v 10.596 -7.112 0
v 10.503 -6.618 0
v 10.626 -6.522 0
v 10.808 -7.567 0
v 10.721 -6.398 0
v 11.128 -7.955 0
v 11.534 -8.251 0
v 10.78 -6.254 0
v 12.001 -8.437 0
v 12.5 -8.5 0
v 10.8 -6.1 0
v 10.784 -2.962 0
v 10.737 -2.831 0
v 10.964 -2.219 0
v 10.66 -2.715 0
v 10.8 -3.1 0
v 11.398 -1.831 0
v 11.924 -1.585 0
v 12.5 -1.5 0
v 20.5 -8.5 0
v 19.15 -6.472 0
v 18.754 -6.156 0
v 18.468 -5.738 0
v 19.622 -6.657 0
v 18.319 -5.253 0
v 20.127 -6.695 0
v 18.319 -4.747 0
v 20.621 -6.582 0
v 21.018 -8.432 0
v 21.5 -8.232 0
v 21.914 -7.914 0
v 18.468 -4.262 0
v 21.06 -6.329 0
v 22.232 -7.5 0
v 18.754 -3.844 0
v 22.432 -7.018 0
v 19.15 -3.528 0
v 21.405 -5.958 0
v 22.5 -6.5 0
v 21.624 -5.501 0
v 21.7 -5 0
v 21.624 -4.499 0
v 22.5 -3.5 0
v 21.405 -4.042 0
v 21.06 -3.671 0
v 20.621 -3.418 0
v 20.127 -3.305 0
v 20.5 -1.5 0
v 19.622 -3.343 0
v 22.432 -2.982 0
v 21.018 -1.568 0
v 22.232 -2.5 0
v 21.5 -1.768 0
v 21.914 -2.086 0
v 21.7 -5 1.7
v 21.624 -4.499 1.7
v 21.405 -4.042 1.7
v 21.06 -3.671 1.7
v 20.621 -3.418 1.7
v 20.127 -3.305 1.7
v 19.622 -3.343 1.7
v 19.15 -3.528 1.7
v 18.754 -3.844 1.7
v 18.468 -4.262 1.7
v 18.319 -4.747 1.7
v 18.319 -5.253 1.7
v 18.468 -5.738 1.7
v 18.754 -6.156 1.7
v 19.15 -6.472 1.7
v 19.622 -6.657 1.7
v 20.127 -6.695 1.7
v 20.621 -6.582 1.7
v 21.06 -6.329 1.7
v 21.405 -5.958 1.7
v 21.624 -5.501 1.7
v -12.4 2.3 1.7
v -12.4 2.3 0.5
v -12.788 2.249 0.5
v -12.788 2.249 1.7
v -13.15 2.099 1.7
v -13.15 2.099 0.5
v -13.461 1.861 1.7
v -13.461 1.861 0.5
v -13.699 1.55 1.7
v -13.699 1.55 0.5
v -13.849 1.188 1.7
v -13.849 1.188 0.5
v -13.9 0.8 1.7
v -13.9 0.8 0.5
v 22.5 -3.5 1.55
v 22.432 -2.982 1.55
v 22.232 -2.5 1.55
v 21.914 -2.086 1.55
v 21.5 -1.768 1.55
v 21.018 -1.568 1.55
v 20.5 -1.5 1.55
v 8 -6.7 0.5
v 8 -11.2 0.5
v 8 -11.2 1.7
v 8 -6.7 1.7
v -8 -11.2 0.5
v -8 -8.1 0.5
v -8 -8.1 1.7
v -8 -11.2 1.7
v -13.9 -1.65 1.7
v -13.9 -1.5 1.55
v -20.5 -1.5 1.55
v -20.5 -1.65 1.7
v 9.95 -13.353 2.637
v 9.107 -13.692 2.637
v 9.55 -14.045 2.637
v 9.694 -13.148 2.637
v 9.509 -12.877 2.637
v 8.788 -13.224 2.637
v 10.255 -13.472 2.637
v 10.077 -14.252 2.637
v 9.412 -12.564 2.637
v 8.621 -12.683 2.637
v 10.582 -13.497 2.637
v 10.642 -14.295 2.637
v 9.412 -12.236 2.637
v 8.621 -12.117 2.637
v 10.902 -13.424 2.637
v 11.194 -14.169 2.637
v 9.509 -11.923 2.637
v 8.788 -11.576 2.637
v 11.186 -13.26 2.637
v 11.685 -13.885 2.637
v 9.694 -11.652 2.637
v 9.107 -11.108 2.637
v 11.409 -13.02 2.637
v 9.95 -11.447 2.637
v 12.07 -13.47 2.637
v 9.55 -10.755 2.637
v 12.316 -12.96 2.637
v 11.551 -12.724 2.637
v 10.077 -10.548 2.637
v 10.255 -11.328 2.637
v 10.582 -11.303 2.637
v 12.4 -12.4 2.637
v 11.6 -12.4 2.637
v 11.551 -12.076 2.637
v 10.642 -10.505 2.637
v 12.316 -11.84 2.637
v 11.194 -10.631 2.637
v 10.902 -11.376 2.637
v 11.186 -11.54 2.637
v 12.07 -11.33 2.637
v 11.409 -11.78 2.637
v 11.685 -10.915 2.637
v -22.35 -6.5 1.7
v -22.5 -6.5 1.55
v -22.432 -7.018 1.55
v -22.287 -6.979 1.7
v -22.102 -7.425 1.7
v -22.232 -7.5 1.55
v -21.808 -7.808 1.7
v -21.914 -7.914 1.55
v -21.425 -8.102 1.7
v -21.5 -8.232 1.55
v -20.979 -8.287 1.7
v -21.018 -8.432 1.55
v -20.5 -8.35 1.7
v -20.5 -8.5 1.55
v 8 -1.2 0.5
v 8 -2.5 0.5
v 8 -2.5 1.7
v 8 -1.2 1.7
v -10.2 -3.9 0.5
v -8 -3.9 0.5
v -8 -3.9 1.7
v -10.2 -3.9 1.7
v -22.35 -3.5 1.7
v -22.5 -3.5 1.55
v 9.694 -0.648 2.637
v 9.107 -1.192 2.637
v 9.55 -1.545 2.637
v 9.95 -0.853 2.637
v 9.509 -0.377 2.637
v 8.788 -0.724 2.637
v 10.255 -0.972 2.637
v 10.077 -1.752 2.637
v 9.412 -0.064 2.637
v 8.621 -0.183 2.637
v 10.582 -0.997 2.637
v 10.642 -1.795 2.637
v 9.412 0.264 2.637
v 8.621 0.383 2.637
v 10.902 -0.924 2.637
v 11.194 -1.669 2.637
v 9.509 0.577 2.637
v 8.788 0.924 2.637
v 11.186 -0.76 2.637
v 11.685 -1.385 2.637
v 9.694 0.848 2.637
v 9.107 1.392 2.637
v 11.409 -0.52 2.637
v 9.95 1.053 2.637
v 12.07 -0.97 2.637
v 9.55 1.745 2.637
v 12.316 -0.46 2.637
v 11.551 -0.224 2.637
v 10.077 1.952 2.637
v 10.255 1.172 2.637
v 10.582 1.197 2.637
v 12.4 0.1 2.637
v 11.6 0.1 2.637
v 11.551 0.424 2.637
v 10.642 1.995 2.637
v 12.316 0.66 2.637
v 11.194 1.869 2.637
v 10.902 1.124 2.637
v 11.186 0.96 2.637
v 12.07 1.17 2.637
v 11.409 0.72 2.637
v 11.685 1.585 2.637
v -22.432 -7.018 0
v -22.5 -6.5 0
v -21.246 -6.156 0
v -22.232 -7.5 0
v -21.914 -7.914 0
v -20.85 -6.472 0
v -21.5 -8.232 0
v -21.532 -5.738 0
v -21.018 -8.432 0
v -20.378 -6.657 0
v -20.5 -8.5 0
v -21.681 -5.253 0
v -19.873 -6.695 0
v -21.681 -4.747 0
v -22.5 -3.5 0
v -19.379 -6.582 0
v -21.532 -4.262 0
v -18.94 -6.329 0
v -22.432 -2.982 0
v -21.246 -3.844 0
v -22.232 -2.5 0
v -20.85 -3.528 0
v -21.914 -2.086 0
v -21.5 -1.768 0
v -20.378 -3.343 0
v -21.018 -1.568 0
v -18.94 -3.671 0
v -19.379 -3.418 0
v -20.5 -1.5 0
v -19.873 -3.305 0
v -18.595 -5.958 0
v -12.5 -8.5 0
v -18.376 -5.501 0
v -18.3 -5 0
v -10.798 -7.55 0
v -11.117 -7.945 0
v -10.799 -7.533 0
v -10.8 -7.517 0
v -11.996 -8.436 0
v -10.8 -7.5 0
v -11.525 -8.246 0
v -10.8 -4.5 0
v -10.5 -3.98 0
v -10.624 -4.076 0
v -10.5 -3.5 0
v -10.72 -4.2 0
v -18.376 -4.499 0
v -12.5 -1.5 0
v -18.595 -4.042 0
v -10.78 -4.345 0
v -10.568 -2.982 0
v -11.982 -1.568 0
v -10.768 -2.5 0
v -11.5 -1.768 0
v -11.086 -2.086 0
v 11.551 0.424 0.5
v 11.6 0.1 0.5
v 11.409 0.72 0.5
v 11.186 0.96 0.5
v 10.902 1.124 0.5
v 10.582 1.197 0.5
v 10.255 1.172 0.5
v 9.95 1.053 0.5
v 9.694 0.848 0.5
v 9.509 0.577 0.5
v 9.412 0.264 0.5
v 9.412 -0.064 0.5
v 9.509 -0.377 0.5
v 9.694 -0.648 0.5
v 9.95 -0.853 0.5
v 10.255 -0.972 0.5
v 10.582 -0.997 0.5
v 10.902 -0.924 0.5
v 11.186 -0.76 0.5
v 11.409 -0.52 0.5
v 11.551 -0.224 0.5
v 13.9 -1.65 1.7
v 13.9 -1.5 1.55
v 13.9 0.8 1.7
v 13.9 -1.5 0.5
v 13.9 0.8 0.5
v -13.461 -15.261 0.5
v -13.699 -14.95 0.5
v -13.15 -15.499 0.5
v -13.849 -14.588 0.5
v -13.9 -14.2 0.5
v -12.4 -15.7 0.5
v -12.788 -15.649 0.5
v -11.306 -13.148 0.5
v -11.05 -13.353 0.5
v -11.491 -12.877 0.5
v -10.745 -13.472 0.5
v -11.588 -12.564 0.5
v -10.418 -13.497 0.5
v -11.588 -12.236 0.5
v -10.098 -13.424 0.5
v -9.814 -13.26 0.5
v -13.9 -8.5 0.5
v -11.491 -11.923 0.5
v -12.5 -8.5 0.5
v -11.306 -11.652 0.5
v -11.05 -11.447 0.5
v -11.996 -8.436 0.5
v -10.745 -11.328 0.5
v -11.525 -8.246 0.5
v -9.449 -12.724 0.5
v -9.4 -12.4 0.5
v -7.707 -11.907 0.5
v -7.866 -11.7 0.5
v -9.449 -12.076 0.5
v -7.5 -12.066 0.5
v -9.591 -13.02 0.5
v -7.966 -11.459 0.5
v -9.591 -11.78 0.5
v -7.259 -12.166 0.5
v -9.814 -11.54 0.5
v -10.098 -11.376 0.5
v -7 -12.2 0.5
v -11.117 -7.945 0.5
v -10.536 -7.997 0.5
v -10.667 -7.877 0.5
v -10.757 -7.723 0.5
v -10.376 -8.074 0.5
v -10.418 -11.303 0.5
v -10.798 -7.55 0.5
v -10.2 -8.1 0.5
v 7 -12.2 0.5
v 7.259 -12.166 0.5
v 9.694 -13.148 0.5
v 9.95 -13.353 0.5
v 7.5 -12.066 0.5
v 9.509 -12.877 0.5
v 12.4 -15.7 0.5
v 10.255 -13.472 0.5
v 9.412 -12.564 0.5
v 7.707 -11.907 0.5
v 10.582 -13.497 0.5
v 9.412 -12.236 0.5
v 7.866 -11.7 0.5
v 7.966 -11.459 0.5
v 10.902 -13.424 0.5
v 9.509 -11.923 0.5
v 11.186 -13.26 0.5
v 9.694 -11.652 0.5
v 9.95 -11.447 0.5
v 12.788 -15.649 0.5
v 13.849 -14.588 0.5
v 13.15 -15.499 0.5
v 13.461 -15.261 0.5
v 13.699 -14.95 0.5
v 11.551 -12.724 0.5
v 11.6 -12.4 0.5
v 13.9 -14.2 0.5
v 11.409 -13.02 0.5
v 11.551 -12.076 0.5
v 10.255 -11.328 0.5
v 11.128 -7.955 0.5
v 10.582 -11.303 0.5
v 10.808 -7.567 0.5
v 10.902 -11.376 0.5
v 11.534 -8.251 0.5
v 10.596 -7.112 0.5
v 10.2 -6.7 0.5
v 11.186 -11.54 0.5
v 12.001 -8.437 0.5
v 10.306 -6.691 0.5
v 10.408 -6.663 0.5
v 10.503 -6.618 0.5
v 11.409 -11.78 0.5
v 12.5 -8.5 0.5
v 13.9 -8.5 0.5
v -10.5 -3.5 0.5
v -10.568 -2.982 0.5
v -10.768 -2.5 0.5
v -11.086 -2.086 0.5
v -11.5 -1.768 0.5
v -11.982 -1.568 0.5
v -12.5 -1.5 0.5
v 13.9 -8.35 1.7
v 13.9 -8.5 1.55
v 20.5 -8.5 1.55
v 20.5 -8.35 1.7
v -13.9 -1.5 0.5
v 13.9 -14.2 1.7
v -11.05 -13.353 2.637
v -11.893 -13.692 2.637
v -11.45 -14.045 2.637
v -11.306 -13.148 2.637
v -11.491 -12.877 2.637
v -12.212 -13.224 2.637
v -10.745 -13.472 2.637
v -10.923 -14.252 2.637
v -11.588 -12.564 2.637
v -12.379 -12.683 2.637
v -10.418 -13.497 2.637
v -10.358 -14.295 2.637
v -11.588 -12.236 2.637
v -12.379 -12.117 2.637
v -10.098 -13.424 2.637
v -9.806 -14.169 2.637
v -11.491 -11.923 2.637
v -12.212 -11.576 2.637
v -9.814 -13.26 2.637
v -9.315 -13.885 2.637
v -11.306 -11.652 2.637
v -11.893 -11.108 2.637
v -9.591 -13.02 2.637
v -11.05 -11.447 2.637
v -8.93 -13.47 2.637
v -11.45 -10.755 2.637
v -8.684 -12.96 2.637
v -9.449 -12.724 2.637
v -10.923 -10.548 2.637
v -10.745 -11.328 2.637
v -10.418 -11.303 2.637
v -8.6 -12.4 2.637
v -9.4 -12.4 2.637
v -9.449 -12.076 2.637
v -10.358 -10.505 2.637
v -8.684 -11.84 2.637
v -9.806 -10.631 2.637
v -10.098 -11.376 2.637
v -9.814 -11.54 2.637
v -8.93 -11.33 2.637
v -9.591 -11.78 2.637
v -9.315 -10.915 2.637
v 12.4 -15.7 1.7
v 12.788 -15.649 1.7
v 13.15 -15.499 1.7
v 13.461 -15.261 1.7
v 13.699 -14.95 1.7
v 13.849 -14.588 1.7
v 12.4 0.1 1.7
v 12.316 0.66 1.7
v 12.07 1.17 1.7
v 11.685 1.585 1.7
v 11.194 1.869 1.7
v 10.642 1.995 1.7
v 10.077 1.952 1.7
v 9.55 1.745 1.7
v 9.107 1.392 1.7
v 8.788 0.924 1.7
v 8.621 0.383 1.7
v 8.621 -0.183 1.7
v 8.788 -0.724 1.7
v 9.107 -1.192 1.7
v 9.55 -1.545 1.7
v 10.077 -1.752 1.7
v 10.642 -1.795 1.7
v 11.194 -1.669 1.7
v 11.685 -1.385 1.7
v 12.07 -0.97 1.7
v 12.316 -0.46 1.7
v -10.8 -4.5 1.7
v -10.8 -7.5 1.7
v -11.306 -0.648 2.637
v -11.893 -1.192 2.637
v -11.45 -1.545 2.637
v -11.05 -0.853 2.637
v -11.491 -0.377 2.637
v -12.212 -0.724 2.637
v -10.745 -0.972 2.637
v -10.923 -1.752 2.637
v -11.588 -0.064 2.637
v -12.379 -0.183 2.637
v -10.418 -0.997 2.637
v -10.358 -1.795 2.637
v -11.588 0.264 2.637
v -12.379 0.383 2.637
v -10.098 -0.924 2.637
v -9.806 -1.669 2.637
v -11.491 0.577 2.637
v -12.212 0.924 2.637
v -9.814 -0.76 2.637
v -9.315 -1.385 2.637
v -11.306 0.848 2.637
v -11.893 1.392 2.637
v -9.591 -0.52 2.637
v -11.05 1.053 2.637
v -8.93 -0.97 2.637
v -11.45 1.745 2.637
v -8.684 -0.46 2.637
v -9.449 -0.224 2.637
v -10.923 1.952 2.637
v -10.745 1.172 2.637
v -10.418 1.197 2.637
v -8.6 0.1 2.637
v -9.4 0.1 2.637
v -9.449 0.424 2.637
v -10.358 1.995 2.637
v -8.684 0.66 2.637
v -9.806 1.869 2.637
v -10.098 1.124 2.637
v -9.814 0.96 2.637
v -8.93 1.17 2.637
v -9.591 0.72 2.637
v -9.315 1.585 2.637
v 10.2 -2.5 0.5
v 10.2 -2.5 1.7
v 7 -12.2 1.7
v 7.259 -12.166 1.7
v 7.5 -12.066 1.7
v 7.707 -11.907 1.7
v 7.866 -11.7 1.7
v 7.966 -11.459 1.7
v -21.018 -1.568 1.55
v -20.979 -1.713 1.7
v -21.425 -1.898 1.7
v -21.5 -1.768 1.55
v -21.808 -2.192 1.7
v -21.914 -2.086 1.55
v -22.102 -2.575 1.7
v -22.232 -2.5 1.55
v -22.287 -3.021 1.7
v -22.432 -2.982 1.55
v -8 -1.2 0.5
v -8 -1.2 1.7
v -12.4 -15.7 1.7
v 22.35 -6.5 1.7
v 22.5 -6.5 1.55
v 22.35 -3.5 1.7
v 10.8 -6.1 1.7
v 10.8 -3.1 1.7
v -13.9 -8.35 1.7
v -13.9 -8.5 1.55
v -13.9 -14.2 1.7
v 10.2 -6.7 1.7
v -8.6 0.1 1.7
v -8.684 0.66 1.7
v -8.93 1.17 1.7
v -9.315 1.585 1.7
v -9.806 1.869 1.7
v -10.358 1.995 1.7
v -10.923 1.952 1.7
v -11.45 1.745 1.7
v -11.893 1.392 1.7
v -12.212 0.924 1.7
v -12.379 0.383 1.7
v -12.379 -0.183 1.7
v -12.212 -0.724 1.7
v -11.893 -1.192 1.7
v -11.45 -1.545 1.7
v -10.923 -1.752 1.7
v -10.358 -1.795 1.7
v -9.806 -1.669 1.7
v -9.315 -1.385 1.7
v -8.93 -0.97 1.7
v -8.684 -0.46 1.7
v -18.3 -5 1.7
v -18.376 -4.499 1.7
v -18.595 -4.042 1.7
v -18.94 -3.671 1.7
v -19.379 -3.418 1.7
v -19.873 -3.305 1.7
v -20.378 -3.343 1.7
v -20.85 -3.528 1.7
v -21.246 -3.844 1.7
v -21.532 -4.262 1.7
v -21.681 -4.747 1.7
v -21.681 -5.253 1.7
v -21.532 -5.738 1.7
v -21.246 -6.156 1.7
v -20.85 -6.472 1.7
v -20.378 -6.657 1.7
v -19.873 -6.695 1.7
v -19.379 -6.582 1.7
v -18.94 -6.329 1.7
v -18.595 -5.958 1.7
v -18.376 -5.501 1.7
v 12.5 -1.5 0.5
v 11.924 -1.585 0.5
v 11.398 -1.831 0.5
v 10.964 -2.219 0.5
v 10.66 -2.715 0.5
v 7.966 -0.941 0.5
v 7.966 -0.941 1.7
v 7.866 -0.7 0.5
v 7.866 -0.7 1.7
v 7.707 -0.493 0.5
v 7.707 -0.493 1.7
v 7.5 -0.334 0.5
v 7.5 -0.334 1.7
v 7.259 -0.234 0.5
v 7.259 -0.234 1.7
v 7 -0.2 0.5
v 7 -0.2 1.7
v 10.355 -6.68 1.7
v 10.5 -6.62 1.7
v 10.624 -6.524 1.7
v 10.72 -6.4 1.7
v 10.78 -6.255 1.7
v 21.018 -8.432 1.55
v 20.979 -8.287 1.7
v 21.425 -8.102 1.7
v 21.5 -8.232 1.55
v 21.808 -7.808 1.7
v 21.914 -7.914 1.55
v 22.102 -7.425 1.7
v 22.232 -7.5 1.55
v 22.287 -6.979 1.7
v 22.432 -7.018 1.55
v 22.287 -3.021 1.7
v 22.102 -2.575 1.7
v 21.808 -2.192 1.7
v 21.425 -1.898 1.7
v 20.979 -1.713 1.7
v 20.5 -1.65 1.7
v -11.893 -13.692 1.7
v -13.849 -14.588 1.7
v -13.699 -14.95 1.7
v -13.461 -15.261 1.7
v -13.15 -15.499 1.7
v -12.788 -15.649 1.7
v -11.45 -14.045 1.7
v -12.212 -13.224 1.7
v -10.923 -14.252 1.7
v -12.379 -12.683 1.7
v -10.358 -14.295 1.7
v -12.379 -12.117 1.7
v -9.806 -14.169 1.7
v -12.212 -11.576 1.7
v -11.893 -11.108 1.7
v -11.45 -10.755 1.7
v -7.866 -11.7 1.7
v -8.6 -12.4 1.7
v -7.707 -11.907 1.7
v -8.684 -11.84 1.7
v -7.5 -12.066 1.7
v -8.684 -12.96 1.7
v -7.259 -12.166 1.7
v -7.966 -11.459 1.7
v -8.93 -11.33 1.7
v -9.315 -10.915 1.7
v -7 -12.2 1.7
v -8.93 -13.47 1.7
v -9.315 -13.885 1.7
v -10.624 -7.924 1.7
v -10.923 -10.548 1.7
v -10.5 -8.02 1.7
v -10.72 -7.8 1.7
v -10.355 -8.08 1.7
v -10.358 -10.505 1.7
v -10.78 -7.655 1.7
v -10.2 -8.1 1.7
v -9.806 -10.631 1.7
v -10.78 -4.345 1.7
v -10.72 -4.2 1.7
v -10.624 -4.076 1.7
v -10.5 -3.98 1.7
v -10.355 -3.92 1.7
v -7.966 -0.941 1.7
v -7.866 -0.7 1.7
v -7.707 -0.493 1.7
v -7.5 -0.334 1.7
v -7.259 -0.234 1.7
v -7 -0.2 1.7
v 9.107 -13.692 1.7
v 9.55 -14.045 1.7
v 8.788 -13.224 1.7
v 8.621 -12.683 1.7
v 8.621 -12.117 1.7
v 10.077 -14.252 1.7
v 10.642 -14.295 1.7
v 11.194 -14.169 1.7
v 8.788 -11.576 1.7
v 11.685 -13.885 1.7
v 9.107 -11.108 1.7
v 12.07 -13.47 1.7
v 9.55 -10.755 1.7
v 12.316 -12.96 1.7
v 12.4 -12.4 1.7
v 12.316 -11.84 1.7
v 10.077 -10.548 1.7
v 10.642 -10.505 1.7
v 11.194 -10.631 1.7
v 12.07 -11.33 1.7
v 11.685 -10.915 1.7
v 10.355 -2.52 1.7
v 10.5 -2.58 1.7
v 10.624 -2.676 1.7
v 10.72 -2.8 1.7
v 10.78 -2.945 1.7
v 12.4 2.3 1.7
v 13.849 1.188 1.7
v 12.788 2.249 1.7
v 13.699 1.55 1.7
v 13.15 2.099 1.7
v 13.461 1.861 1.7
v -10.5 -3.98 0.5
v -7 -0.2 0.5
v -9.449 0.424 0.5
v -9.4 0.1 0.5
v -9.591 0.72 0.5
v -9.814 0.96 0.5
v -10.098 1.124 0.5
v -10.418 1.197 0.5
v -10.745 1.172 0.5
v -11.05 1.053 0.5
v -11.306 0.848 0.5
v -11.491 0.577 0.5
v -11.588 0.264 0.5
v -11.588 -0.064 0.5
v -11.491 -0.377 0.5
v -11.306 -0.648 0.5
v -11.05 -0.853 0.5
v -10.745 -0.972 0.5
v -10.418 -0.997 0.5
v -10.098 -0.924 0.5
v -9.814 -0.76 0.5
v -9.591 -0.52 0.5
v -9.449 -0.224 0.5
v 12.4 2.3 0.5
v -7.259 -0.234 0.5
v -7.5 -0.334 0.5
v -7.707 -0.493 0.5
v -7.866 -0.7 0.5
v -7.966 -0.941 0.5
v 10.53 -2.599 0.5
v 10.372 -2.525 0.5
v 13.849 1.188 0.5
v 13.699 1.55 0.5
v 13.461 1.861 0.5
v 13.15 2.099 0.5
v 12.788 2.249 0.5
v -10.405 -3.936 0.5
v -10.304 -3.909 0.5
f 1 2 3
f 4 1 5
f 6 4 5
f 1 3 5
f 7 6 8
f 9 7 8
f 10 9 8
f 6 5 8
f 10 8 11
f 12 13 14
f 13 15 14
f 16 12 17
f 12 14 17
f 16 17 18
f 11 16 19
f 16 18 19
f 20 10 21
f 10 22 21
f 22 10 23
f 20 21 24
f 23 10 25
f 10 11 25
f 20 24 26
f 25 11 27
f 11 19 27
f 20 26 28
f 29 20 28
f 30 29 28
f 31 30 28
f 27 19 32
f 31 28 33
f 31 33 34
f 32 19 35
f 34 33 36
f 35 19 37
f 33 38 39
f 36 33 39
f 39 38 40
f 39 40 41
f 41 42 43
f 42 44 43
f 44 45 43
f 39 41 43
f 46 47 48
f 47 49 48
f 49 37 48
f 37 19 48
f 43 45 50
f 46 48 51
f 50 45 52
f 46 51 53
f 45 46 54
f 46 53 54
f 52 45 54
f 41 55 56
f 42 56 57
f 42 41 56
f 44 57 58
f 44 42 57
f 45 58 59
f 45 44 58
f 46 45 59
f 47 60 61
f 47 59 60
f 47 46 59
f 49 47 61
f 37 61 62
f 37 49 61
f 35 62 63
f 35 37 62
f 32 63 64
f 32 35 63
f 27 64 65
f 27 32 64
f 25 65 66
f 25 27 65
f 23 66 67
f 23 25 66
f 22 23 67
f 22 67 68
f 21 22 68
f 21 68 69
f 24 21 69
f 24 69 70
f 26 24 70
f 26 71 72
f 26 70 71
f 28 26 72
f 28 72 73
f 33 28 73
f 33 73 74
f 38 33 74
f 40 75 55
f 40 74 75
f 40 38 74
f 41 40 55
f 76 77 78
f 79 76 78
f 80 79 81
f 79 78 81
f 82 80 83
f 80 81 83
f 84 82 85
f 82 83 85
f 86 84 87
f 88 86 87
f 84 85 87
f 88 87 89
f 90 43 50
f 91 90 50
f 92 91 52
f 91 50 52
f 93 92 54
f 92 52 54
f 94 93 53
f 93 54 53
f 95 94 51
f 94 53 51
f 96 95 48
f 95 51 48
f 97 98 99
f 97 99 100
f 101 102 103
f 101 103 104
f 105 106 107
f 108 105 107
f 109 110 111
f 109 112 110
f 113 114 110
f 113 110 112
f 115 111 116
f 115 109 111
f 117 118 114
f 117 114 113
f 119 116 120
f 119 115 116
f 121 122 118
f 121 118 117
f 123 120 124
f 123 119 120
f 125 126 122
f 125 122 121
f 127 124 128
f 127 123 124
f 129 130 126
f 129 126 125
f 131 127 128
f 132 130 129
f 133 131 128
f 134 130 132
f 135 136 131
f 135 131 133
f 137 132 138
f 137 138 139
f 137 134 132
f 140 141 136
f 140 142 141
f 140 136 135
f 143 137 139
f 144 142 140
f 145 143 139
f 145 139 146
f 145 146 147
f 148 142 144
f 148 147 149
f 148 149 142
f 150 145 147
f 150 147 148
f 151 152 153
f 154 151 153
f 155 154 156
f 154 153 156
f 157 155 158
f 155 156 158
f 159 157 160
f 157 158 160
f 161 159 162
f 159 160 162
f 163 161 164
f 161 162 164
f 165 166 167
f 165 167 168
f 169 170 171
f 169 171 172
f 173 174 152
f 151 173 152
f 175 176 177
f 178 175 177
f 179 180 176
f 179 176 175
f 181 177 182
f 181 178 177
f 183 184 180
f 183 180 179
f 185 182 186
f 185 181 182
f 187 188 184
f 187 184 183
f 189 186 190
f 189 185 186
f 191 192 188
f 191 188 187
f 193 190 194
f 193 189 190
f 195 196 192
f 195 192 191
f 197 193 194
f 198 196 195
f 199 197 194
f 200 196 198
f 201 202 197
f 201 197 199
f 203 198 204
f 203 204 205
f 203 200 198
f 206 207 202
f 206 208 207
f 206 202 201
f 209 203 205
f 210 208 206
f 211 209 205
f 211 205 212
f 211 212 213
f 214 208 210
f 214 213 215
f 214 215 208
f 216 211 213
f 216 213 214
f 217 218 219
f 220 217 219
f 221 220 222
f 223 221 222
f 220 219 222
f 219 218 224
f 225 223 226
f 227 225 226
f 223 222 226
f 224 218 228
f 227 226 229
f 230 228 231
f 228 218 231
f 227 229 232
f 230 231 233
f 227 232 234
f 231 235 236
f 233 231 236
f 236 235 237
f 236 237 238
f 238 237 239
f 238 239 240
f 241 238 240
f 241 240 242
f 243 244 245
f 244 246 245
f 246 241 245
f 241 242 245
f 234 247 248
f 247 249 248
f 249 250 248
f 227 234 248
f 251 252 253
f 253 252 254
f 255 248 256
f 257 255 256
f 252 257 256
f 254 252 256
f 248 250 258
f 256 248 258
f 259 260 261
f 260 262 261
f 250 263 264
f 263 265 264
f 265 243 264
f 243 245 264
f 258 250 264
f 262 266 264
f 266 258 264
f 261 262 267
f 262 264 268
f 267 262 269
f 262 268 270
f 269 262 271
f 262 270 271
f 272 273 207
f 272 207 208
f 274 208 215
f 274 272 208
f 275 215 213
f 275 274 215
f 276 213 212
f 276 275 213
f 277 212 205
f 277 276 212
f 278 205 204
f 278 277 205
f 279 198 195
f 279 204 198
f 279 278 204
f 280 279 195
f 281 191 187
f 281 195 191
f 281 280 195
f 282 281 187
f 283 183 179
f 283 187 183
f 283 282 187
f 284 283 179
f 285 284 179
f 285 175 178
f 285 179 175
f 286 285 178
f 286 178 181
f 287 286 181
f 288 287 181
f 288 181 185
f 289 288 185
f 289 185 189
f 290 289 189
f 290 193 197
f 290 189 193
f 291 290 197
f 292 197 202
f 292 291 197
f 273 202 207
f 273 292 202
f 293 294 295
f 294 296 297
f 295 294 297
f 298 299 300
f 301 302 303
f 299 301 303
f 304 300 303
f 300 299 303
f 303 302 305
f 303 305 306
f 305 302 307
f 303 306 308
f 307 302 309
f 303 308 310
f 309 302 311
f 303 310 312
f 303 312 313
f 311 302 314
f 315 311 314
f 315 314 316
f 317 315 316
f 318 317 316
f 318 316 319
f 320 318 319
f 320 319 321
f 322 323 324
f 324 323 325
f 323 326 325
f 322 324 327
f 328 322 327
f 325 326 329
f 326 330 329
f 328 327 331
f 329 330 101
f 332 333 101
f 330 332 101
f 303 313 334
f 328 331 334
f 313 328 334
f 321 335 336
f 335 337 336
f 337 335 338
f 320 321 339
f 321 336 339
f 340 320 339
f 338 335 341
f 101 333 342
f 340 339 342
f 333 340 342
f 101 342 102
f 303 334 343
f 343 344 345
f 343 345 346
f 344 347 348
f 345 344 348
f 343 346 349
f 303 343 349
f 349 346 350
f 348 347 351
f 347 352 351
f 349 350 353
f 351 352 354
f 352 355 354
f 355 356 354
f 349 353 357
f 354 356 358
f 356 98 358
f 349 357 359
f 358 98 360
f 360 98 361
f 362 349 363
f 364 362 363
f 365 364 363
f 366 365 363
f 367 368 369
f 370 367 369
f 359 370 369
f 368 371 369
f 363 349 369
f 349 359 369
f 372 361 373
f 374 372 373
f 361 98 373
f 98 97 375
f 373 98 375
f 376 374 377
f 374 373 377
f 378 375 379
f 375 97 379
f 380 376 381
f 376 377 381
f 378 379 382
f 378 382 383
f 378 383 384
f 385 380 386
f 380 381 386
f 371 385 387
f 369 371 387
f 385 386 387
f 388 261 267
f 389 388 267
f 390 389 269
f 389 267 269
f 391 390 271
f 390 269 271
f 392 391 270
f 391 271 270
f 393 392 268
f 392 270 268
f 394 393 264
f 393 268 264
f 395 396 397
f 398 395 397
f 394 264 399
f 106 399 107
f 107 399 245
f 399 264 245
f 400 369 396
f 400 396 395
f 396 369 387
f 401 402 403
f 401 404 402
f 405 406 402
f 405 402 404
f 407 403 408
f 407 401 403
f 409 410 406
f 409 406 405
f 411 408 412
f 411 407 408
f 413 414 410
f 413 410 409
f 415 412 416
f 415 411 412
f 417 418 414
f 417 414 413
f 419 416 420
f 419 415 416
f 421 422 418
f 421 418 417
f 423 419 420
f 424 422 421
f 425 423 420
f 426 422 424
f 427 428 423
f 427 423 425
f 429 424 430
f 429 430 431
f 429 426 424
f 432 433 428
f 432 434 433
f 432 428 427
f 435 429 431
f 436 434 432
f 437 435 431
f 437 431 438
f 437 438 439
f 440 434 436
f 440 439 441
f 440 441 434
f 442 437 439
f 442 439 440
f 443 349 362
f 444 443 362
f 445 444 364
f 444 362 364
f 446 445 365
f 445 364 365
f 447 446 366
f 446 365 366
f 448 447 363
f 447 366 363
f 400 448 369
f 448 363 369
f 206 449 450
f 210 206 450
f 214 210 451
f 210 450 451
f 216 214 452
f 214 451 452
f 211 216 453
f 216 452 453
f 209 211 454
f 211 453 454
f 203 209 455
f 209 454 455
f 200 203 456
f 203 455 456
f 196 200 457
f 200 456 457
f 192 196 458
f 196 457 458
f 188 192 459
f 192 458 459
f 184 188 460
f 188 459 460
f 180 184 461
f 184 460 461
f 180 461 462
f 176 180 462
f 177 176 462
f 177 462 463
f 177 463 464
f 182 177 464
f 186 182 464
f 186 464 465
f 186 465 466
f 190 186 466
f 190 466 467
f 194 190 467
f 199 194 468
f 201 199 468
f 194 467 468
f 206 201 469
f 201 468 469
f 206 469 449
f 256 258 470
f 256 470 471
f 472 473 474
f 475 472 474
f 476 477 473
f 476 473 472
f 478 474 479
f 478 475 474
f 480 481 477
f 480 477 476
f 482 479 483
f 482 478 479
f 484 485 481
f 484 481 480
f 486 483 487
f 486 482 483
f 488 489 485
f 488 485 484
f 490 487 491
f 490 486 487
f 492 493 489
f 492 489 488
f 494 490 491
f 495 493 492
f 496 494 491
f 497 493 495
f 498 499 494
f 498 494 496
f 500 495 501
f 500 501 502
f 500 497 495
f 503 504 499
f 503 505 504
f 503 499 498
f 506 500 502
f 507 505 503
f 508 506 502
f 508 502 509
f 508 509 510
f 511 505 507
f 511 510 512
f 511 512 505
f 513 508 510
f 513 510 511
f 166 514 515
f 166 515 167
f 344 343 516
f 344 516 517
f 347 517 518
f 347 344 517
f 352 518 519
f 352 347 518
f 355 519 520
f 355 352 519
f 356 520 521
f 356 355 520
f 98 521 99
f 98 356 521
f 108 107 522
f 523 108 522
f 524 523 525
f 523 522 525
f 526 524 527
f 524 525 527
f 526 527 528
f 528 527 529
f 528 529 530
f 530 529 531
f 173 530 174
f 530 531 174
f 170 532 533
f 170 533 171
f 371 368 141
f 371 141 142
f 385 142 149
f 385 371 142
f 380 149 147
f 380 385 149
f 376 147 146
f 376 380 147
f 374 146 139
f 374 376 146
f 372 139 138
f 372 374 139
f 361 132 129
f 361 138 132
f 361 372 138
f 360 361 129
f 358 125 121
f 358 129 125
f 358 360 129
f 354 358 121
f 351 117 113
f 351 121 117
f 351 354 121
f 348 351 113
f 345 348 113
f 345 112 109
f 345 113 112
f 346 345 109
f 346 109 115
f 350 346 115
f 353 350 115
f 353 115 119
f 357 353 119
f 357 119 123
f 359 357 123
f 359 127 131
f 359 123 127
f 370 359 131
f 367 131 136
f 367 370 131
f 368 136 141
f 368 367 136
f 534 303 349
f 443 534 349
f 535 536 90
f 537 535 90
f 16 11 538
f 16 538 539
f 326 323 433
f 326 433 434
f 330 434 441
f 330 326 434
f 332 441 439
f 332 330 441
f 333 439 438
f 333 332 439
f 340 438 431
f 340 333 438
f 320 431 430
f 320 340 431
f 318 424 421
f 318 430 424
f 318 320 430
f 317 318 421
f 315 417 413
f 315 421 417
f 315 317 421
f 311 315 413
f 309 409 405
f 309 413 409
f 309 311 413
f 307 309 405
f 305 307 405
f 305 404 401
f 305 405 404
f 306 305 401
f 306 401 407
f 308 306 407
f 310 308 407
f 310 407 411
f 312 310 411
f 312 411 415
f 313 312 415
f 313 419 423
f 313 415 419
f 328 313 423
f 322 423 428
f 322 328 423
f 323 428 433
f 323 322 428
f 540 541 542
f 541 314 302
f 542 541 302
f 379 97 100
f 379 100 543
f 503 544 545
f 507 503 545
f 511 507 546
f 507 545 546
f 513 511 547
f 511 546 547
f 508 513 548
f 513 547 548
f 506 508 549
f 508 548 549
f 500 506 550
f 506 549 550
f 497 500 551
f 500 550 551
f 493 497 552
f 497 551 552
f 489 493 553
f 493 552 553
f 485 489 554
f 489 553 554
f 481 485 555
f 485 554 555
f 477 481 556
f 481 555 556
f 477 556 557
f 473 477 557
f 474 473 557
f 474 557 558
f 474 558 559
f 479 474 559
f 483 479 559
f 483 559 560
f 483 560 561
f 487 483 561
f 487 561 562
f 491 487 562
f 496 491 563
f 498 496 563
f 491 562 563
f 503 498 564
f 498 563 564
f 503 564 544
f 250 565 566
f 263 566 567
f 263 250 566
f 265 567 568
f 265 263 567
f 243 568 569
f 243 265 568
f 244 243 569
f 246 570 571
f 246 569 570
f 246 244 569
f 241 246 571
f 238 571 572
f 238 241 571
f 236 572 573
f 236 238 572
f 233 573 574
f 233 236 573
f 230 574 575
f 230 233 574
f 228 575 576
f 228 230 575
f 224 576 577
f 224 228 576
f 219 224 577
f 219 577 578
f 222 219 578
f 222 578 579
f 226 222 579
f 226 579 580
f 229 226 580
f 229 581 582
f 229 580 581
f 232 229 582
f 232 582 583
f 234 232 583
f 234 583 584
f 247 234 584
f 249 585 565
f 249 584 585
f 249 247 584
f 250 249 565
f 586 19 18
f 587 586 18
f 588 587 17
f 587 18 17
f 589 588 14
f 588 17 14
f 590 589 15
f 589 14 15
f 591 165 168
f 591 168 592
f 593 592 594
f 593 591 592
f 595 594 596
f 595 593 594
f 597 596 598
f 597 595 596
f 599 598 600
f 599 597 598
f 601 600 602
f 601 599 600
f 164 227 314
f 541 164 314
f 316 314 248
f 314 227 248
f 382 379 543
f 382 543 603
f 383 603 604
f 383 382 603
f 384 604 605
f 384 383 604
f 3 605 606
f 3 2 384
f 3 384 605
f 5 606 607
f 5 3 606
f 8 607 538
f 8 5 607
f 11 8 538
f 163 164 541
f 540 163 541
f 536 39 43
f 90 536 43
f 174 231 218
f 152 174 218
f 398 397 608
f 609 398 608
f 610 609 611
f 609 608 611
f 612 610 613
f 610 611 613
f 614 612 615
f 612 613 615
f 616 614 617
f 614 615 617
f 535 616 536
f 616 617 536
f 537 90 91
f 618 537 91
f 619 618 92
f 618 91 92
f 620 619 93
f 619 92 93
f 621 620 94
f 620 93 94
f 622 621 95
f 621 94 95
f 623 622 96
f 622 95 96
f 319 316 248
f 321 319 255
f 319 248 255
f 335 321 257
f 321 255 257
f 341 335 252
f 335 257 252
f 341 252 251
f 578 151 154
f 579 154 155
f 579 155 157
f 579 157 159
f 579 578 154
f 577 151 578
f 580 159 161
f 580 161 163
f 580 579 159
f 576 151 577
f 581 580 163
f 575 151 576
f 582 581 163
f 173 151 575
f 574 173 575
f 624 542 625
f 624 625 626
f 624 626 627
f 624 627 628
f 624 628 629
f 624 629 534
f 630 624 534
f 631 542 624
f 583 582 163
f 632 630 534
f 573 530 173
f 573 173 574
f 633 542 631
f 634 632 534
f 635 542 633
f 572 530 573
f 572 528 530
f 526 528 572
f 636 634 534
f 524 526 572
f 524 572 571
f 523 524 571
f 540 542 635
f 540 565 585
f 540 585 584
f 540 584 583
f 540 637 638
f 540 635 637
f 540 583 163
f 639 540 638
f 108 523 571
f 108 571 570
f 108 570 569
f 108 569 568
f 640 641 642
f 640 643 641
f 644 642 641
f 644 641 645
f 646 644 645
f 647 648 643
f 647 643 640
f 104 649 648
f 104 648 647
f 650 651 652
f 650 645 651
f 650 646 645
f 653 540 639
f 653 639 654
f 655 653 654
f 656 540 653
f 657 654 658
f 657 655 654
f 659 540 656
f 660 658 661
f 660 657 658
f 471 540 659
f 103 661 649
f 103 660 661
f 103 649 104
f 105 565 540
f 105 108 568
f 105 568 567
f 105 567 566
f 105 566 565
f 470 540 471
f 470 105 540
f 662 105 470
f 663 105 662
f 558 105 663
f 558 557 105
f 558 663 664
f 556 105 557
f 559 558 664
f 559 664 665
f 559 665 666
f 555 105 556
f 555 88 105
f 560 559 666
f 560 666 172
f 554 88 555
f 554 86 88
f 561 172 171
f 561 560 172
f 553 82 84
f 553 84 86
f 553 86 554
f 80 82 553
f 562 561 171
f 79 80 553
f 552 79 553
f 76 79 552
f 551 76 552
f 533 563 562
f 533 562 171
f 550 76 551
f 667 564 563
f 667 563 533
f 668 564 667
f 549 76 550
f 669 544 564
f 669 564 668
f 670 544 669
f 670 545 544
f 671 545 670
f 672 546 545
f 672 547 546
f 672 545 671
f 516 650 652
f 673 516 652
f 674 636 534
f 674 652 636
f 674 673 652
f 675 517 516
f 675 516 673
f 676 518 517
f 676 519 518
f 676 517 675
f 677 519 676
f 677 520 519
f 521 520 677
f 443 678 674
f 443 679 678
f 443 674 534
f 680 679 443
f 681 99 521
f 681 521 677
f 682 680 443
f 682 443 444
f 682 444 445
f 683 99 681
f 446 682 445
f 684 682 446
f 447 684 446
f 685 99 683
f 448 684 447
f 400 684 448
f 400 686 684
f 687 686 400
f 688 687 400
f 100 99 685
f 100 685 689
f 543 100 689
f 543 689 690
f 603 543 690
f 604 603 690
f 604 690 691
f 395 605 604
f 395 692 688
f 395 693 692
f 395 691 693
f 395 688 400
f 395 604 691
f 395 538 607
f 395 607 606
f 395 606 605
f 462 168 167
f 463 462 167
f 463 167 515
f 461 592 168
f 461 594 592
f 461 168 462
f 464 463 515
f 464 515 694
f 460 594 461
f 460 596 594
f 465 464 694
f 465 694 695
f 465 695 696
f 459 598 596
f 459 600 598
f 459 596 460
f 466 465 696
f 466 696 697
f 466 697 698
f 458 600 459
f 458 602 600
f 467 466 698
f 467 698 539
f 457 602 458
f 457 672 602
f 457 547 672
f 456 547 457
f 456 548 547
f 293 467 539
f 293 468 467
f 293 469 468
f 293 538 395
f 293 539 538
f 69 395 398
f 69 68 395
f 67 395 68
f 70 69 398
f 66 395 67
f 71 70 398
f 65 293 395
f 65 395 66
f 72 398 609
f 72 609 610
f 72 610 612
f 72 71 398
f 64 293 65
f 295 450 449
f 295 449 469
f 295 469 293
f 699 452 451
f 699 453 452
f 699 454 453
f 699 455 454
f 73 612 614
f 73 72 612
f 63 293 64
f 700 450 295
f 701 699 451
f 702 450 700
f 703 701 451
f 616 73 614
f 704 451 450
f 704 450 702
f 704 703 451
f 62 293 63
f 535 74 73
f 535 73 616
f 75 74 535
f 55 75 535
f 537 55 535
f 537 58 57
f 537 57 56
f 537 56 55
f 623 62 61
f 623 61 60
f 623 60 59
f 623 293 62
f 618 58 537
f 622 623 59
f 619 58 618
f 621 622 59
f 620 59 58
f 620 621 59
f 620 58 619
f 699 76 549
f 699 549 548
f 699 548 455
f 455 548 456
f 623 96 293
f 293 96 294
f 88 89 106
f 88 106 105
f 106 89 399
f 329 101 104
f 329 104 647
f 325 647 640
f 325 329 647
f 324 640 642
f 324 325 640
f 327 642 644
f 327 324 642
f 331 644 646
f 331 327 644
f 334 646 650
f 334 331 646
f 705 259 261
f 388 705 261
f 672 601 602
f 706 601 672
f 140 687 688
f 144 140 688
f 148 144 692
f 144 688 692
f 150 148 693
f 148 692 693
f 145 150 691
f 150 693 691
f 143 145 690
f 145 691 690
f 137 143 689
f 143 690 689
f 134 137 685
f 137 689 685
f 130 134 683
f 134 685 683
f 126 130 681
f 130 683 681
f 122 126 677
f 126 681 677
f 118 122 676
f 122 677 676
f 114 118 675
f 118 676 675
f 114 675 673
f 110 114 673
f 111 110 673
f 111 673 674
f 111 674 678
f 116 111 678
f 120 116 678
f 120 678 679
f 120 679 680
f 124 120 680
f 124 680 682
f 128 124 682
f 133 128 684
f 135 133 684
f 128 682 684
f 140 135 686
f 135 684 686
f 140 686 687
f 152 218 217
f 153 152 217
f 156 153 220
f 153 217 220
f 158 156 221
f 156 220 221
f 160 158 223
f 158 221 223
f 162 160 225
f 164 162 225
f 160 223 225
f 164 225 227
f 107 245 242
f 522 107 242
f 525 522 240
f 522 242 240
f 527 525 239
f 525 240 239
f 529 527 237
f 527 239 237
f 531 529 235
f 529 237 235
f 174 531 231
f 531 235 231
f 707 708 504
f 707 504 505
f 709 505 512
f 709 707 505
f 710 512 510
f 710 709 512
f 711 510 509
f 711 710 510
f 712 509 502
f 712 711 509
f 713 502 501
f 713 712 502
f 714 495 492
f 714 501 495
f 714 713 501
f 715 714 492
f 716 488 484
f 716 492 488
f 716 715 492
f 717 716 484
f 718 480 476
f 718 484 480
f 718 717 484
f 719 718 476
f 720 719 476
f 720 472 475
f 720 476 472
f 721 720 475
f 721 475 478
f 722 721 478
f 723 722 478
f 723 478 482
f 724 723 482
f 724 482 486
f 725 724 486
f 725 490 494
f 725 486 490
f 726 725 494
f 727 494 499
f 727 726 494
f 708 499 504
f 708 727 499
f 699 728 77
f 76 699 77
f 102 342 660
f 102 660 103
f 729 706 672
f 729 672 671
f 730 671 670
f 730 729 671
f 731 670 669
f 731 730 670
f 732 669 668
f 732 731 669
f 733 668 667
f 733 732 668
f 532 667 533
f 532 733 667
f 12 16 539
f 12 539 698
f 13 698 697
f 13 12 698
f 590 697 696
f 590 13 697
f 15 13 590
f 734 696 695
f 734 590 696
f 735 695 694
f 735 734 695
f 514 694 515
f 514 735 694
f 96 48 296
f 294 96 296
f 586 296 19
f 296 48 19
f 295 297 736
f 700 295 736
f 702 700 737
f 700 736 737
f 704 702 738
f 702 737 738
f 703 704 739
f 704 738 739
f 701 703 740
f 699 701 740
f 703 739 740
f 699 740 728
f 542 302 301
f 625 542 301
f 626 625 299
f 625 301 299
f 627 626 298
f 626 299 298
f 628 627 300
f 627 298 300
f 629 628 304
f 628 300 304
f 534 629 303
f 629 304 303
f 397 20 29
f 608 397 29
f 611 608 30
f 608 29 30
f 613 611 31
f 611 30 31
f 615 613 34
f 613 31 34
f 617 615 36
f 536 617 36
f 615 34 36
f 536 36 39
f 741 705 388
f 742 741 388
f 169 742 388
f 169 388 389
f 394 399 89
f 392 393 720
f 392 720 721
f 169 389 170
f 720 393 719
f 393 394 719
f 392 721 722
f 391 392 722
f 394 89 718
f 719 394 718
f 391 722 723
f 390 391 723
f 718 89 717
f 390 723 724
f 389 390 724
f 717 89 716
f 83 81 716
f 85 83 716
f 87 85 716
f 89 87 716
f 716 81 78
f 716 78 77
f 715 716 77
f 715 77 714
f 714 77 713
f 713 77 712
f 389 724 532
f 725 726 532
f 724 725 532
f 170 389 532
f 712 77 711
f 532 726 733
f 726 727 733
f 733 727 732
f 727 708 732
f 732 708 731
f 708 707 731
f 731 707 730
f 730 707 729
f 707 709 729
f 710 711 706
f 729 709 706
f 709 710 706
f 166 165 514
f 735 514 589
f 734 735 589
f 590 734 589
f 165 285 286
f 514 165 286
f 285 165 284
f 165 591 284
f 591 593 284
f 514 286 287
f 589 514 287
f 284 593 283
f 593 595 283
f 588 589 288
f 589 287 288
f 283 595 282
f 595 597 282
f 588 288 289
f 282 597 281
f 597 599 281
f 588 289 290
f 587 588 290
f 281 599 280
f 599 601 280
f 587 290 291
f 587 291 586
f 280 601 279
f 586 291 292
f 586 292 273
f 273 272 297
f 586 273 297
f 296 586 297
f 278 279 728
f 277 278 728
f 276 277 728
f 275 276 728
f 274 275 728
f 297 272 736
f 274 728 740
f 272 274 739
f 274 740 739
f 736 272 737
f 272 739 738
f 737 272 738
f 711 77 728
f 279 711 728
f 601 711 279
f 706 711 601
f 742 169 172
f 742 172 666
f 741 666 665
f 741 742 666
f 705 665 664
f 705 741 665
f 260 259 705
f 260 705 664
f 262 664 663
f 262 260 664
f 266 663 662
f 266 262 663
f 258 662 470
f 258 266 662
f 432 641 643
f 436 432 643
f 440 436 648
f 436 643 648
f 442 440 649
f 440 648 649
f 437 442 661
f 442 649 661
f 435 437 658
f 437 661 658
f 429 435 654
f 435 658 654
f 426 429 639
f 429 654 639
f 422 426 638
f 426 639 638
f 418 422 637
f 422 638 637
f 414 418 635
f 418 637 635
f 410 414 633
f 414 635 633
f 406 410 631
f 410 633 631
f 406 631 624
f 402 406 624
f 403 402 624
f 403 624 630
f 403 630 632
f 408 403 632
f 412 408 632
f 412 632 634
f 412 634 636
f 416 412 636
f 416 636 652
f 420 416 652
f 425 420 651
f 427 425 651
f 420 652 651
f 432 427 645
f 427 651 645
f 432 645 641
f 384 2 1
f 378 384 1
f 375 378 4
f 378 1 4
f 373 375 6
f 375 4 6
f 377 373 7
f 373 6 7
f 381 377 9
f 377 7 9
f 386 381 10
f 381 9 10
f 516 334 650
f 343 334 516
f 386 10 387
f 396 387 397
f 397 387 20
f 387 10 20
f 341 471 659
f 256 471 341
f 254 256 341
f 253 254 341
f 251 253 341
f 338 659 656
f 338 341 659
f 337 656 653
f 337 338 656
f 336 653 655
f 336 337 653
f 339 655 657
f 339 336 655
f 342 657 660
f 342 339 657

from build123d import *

# Parameters (mm, degrees)
EXTRUDE_START          = 0.5
EXTRUDE_0_5_1_2_DEPTH  = 1.2
EXTRUDE_1_7_DEPTH      = 1.7
EXTRUDE_START_2        = 1.7
SKETCH_721_R           = 1.9
EXTRUDE_774_DEPTH      = 0.9373
SKETCH_M2_R            = 1.1
CUT_EXTRUDE_907_DEPTH  = 28.562571565
SKETCH_M3_R            = 1.7
CUT_EXTRUDE_1008_DEPTH = 28.562571565
CUT_EXTRUDE_1244_DEPTH = 28.562571565
CHAMFER_C0_15_SIZE     = 0.15


with BuildPart() as part:
    # Sketch 220 → 托板抬高0_5并厚1_2 (new body)
    with BuildSketch(Plane.XY.offset(EXTRUDE_START)):
        with BuildLine():
            Line((-12.4, -15.7), (12.4, -15.7))
            ThreePointArc((12.4, -15.7), (13.460660172, -15.260660172), (13.9, -14.2))
            Line((13.9, -14.2), (13.9, 0.8))
            ThreePointArc((13.9, 0.8), (13.460660172, 1.860660172), (12.4, 2.3))
            Line((12.4, 2.3), (-12.4, 2.3))
            ThreePointArc((-12.4, 2.3), (-13.460660172, 1.860660172), (-13.9, 0.8))
            Line((-13.9, 0.8), (-13.9, -14.2))
            ThreePointArc((-13.9, -14.2), (-13.460660172, -15.260660172), (-12.4, -15.7))
        make_face()
        with BuildLine():
            Line((-7, -12.2), (7, -12.2))
            ThreePointArc((7, -12.2), (7.707106781, -11.907106781), (8, -11.2))
            Line((8, -11.2), (8, -1.2))
            ThreePointArc((8, -1.2), (7.707106781, -0.492893219), (7, -0.2))
            Line((7, -0.2), (-7, -0.2))
            ThreePointArc((-7, -0.2), (-7.707106781, -0.492893219), (-8, -1.2))
            Line((-8, -1.2), (-8, -11.2))
            ThreePointArc((-8, -11.2), (-7.707106781, -11.907106781), (-7, -12.2))
        make_face(mode=Mode.SUBTRACT)
    extrude(amount=EXTRUDE_0_5_1_2_DEPTH)

    # Sketch 459 → 安装耳底面基准与厚1_7 (add)
    with BuildSketch(Plane.XY):
        with BuildLine():
            Line((-20.5, -8.5), (-12.5, -8.5))
            ThreePointArc((-12.5, -8.5), (-11.085786438, -7.914213562), (-10.5, -6.5))
            Line((-10.5, -6.5), (-10.5, -3.5))
            ThreePointArc((-10.5, -3.5), (-11.085786438, -2.085786438), (-12.5, -1.5))
            Line((-12.5, -1.5), (-20.5, -1.5))
            ThreePointArc((-20.5, -1.5), (-21.914213562, -2.085786438), (-22.5, -3.5))
            Line((-22.5, -3.5), (-22.5, -6.5))
            ThreePointArc((-22.5, -6.5), (-21.914213562, -7.914213562), (-20.5, -8.5))
        make_face()
        with BuildLine():
            Line((12.5, -8.5), (20.5, -8.5))
            ThreePointArc((20.5, -8.5), (21.914213562, -7.914213562), (22.5, -6.5))
            Line((22.5, -6.5), (22.5, -3.5))
            ThreePointArc((22.5, -3.5), (21.914213562, -2.085786438), (20.5, -1.5))
            Line((20.5, -1.5), (12.5, -1.5))
            ThreePointArc((12.5, -1.5), (11.085786438, -2.085786438), (10.5, -3.5))
            Line((10.5, -3.5), (10.5, -6.5))
            ThreePointArc((10.5, -6.5), (11.085786438, -7.914213562), (12.5, -8.5))
        make_face()
    extrude(amount=EXTRUDE_1_7_DEPTH)

    # Sketch 721 → Extrude 774 (add)
    with BuildSketch(Plane.XY.offset(EXTRUDE_START_2)):
        with Locations((-10.5, -12.4)):
            Circle(SKETCH_721_R)
        with Locations((-10.5, 0.1)):
            Circle(SKETCH_721_R)
        with Locations((10.5, -12.4)):
            Circle(SKETCH_721_R)
        with Locations((10.5, 0.1)):
            Circle(SKETCH_721_R)
    extrude(amount=EXTRUDE_774_DEPTH)

    # 四个相机M2间隙孔 → Cut-Extrude 907 (cut, through all)
    with BuildSketch(Plane.XY):
        with Locations((-10.5, -12.4)):
            Circle(SKETCH_M2_R)
        with Locations((-10.5, 0.1)):
            Circle(SKETCH_M2_R)
        with Locations((10.5, -12.4)):
            Circle(SKETCH_M2_R)
        with Locations((10.5, 0.1)):
            Circle(SKETCH_M2_R)
    extrude(amount=CUT_EXTRUDE_907_DEPTH, mode=Mode.SUBTRACT)

    # 双耳M3间隙孔 → Cut-Extrude 1008 (cut, through all)
    with BuildSketch(Plane.XY):
        with Locations((-20, -5)):
            Circle(SKETCH_M3_R)
        with Locations((20, -5)):
            Circle(SKETCH_M3_R)
    extrude(amount=CUT_EXTRUDE_1008_DEPTH, mode=Mode.SUBTRACT)

    # Sketch 1078 → Cut-Extrude 1244 (cut, through all)
    with BuildSketch(Plane.XY):
        with BuildLine():
            Line((7.2, -6.7), (10.2, -6.7))
            ThreePointArc((10.2, -6.7), (10.624264069, -6.524264069), (10.8, -6.1))
            Line((10.8, -6.1), (10.8, -3.1))
            ThreePointArc((10.8, -3.1), (10.624264069, -2.675735931), (10.2, -2.5))
            Line((10.2, -2.5), (7.2, -2.5))
            ThreePointArc((7.2, -2.5), (6.775735931, -2.675735931), (6.6, -3.1))
            Line((6.6, -3.1), (6.6, -6.1))
            ThreePointArc((6.6, -6.1), (6.775735931, -6.524264069), (7.2, -6.7))
        make_face()
        with BuildLine():
            Line((-10.2, -8.1), (-7.2, -8.1))
            ThreePointArc((-7.2, -8.1), (-6.775735931, -7.924264069), (-6.6, -7.5))
            Line((-6.6, -7.5), (-6.6, -4.5))
            ThreePointArc((-6.6, -4.5), (-6.775735931, -4.075735931), (-7.2, -3.9))
            Line((-7.2, -3.9), (-10.2, -3.9))
            ThreePointArc((-10.2, -3.9), (-10.624264069, -4.075735931), (-10.8, -4.5))
            Line((-10.8, -4.5), (-10.8, -7.5))
            ThreePointArc((-10.8, -7.5), (-10.624264069, -7.924264069), (-10.2, -8.1))
        make_face()
    extrude(amount=CUT_EXTRUDE_1244_DEPTH, mode=Mode.SUBTRACT)

    # 安装耳外缘去锐C0_15
    chamfer_c0_15_edges = [part.edges().sort_by_distance(p)[0] for p in [
        (21.914213562, -2.085786438, 1.7),
        (22.5, -5, 1.7),
        (21.914213562, -7.914213562, 1.7),
        (-21.914213562, -7.914213562, 1.7),
        (-21.914213562, -2.085786438, 1.7),
        (-22.5, -5, 1.7),
    ]]
    chamfer(chamfer_c0_15_edges, length=CHAMFER_C0_15_SIZE)


solid = part.part
